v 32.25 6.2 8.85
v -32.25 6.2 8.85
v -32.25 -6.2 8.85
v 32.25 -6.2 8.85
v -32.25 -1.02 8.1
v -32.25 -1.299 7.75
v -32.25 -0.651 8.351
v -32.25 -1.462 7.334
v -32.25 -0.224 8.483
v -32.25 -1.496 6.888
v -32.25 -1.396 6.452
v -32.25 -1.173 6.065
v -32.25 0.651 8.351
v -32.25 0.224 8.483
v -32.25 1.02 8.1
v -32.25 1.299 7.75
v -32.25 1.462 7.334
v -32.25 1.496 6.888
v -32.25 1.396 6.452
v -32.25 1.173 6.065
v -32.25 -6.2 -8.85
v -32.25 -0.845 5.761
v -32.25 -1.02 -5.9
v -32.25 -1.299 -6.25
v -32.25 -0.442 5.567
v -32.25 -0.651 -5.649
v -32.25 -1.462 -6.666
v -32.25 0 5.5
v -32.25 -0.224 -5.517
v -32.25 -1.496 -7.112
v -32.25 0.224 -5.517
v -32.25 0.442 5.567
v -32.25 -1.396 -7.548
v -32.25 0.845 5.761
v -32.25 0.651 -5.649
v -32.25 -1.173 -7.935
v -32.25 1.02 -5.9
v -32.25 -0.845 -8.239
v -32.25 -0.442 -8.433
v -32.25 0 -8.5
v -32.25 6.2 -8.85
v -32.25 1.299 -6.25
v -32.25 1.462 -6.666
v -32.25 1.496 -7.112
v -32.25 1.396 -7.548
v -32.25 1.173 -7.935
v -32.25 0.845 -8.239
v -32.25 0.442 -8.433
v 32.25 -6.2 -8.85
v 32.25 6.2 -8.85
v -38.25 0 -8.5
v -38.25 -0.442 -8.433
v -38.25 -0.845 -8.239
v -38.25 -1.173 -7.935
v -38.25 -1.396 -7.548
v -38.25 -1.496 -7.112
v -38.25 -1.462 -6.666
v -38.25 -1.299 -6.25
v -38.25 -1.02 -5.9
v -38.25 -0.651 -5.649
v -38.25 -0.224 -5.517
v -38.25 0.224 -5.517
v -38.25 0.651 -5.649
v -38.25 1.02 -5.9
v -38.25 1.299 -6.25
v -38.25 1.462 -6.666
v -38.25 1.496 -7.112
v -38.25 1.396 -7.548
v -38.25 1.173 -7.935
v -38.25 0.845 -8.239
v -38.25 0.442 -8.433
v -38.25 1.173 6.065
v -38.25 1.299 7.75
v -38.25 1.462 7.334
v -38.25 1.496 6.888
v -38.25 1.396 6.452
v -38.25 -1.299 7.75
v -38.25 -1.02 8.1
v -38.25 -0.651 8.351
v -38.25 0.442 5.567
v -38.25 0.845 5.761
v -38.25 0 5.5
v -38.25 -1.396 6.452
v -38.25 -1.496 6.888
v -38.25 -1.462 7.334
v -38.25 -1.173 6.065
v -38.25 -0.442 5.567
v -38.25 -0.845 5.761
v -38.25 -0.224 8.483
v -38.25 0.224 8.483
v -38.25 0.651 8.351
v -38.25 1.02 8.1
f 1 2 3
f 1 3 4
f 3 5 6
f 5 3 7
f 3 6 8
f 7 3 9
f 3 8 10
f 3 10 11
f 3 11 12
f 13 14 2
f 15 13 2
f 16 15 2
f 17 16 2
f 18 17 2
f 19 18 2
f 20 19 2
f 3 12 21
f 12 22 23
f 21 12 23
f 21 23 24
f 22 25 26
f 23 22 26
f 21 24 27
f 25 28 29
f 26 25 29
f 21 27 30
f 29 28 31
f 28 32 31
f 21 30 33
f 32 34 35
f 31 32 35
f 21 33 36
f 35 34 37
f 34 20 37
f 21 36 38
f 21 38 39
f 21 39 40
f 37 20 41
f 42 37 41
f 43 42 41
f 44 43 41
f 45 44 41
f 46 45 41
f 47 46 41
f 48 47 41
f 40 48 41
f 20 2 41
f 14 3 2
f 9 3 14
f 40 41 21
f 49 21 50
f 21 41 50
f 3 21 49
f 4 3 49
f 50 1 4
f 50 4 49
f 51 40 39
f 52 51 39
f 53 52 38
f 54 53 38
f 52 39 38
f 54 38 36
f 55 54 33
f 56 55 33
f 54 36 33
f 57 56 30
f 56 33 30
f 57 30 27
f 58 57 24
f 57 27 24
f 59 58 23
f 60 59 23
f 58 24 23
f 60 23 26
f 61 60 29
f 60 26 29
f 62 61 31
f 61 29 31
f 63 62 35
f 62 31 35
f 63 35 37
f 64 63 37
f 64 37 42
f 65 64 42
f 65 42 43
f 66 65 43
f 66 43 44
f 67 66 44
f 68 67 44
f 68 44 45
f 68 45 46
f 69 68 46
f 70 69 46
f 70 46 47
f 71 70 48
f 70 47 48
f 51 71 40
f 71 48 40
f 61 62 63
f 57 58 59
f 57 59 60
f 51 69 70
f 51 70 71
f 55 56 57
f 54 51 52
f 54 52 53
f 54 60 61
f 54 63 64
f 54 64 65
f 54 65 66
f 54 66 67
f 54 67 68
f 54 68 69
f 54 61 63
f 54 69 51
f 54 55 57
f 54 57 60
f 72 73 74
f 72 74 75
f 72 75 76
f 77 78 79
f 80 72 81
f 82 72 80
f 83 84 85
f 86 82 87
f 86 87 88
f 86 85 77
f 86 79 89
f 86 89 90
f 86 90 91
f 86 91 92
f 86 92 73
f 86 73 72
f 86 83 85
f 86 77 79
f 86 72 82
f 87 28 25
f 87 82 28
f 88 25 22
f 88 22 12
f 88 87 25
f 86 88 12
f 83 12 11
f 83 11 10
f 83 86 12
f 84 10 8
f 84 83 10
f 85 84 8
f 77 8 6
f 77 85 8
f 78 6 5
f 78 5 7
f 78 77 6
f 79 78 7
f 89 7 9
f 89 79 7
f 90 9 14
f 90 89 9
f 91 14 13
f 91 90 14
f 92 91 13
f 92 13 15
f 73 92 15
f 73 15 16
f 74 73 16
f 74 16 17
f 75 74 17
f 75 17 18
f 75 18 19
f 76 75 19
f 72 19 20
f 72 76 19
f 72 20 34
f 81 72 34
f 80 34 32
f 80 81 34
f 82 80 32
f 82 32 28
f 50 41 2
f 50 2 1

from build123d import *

# Parameters (mm, degrees)
SKETCH1_W           = 64.5
SKETCH1_H           = 17.7
BOSS_EXTRUDE1_DEPTH = 6.2
SKETCH2_R           = 1.5
BOSS_EXTRUDE2_DEPTH = 6


with BuildPart() as part:
    # Sketch1 → Boss-Extrude1 (new, symmetric)
    with BuildSketch(Plane(origin=(0, 0, 0), x_dir=(1, 0, 0), z_dir=(0, 1, 0))):
        Rectangle(SKETCH1_W, SKETCH1_H)
    extrude(amount=BOSS_EXTRUDE1_DEPTH, both=True)

    # Sketch2 → Boss-Extrude2 (add, symmetric)
    with BuildSketch(Plane.ZY.offset(32.25)):
        with Locations(Location((-7, 0, 0), (0, 0, 180))):
            Circle(SKETCH2_R)
        with Locations(Location((7, 0, 0), (0, 0, 180))):
            Circle(SKETCH2_R)
    extrude(amount=BOSS_EXTRUDE2_DEPTH, both=True)


solid = part.part
